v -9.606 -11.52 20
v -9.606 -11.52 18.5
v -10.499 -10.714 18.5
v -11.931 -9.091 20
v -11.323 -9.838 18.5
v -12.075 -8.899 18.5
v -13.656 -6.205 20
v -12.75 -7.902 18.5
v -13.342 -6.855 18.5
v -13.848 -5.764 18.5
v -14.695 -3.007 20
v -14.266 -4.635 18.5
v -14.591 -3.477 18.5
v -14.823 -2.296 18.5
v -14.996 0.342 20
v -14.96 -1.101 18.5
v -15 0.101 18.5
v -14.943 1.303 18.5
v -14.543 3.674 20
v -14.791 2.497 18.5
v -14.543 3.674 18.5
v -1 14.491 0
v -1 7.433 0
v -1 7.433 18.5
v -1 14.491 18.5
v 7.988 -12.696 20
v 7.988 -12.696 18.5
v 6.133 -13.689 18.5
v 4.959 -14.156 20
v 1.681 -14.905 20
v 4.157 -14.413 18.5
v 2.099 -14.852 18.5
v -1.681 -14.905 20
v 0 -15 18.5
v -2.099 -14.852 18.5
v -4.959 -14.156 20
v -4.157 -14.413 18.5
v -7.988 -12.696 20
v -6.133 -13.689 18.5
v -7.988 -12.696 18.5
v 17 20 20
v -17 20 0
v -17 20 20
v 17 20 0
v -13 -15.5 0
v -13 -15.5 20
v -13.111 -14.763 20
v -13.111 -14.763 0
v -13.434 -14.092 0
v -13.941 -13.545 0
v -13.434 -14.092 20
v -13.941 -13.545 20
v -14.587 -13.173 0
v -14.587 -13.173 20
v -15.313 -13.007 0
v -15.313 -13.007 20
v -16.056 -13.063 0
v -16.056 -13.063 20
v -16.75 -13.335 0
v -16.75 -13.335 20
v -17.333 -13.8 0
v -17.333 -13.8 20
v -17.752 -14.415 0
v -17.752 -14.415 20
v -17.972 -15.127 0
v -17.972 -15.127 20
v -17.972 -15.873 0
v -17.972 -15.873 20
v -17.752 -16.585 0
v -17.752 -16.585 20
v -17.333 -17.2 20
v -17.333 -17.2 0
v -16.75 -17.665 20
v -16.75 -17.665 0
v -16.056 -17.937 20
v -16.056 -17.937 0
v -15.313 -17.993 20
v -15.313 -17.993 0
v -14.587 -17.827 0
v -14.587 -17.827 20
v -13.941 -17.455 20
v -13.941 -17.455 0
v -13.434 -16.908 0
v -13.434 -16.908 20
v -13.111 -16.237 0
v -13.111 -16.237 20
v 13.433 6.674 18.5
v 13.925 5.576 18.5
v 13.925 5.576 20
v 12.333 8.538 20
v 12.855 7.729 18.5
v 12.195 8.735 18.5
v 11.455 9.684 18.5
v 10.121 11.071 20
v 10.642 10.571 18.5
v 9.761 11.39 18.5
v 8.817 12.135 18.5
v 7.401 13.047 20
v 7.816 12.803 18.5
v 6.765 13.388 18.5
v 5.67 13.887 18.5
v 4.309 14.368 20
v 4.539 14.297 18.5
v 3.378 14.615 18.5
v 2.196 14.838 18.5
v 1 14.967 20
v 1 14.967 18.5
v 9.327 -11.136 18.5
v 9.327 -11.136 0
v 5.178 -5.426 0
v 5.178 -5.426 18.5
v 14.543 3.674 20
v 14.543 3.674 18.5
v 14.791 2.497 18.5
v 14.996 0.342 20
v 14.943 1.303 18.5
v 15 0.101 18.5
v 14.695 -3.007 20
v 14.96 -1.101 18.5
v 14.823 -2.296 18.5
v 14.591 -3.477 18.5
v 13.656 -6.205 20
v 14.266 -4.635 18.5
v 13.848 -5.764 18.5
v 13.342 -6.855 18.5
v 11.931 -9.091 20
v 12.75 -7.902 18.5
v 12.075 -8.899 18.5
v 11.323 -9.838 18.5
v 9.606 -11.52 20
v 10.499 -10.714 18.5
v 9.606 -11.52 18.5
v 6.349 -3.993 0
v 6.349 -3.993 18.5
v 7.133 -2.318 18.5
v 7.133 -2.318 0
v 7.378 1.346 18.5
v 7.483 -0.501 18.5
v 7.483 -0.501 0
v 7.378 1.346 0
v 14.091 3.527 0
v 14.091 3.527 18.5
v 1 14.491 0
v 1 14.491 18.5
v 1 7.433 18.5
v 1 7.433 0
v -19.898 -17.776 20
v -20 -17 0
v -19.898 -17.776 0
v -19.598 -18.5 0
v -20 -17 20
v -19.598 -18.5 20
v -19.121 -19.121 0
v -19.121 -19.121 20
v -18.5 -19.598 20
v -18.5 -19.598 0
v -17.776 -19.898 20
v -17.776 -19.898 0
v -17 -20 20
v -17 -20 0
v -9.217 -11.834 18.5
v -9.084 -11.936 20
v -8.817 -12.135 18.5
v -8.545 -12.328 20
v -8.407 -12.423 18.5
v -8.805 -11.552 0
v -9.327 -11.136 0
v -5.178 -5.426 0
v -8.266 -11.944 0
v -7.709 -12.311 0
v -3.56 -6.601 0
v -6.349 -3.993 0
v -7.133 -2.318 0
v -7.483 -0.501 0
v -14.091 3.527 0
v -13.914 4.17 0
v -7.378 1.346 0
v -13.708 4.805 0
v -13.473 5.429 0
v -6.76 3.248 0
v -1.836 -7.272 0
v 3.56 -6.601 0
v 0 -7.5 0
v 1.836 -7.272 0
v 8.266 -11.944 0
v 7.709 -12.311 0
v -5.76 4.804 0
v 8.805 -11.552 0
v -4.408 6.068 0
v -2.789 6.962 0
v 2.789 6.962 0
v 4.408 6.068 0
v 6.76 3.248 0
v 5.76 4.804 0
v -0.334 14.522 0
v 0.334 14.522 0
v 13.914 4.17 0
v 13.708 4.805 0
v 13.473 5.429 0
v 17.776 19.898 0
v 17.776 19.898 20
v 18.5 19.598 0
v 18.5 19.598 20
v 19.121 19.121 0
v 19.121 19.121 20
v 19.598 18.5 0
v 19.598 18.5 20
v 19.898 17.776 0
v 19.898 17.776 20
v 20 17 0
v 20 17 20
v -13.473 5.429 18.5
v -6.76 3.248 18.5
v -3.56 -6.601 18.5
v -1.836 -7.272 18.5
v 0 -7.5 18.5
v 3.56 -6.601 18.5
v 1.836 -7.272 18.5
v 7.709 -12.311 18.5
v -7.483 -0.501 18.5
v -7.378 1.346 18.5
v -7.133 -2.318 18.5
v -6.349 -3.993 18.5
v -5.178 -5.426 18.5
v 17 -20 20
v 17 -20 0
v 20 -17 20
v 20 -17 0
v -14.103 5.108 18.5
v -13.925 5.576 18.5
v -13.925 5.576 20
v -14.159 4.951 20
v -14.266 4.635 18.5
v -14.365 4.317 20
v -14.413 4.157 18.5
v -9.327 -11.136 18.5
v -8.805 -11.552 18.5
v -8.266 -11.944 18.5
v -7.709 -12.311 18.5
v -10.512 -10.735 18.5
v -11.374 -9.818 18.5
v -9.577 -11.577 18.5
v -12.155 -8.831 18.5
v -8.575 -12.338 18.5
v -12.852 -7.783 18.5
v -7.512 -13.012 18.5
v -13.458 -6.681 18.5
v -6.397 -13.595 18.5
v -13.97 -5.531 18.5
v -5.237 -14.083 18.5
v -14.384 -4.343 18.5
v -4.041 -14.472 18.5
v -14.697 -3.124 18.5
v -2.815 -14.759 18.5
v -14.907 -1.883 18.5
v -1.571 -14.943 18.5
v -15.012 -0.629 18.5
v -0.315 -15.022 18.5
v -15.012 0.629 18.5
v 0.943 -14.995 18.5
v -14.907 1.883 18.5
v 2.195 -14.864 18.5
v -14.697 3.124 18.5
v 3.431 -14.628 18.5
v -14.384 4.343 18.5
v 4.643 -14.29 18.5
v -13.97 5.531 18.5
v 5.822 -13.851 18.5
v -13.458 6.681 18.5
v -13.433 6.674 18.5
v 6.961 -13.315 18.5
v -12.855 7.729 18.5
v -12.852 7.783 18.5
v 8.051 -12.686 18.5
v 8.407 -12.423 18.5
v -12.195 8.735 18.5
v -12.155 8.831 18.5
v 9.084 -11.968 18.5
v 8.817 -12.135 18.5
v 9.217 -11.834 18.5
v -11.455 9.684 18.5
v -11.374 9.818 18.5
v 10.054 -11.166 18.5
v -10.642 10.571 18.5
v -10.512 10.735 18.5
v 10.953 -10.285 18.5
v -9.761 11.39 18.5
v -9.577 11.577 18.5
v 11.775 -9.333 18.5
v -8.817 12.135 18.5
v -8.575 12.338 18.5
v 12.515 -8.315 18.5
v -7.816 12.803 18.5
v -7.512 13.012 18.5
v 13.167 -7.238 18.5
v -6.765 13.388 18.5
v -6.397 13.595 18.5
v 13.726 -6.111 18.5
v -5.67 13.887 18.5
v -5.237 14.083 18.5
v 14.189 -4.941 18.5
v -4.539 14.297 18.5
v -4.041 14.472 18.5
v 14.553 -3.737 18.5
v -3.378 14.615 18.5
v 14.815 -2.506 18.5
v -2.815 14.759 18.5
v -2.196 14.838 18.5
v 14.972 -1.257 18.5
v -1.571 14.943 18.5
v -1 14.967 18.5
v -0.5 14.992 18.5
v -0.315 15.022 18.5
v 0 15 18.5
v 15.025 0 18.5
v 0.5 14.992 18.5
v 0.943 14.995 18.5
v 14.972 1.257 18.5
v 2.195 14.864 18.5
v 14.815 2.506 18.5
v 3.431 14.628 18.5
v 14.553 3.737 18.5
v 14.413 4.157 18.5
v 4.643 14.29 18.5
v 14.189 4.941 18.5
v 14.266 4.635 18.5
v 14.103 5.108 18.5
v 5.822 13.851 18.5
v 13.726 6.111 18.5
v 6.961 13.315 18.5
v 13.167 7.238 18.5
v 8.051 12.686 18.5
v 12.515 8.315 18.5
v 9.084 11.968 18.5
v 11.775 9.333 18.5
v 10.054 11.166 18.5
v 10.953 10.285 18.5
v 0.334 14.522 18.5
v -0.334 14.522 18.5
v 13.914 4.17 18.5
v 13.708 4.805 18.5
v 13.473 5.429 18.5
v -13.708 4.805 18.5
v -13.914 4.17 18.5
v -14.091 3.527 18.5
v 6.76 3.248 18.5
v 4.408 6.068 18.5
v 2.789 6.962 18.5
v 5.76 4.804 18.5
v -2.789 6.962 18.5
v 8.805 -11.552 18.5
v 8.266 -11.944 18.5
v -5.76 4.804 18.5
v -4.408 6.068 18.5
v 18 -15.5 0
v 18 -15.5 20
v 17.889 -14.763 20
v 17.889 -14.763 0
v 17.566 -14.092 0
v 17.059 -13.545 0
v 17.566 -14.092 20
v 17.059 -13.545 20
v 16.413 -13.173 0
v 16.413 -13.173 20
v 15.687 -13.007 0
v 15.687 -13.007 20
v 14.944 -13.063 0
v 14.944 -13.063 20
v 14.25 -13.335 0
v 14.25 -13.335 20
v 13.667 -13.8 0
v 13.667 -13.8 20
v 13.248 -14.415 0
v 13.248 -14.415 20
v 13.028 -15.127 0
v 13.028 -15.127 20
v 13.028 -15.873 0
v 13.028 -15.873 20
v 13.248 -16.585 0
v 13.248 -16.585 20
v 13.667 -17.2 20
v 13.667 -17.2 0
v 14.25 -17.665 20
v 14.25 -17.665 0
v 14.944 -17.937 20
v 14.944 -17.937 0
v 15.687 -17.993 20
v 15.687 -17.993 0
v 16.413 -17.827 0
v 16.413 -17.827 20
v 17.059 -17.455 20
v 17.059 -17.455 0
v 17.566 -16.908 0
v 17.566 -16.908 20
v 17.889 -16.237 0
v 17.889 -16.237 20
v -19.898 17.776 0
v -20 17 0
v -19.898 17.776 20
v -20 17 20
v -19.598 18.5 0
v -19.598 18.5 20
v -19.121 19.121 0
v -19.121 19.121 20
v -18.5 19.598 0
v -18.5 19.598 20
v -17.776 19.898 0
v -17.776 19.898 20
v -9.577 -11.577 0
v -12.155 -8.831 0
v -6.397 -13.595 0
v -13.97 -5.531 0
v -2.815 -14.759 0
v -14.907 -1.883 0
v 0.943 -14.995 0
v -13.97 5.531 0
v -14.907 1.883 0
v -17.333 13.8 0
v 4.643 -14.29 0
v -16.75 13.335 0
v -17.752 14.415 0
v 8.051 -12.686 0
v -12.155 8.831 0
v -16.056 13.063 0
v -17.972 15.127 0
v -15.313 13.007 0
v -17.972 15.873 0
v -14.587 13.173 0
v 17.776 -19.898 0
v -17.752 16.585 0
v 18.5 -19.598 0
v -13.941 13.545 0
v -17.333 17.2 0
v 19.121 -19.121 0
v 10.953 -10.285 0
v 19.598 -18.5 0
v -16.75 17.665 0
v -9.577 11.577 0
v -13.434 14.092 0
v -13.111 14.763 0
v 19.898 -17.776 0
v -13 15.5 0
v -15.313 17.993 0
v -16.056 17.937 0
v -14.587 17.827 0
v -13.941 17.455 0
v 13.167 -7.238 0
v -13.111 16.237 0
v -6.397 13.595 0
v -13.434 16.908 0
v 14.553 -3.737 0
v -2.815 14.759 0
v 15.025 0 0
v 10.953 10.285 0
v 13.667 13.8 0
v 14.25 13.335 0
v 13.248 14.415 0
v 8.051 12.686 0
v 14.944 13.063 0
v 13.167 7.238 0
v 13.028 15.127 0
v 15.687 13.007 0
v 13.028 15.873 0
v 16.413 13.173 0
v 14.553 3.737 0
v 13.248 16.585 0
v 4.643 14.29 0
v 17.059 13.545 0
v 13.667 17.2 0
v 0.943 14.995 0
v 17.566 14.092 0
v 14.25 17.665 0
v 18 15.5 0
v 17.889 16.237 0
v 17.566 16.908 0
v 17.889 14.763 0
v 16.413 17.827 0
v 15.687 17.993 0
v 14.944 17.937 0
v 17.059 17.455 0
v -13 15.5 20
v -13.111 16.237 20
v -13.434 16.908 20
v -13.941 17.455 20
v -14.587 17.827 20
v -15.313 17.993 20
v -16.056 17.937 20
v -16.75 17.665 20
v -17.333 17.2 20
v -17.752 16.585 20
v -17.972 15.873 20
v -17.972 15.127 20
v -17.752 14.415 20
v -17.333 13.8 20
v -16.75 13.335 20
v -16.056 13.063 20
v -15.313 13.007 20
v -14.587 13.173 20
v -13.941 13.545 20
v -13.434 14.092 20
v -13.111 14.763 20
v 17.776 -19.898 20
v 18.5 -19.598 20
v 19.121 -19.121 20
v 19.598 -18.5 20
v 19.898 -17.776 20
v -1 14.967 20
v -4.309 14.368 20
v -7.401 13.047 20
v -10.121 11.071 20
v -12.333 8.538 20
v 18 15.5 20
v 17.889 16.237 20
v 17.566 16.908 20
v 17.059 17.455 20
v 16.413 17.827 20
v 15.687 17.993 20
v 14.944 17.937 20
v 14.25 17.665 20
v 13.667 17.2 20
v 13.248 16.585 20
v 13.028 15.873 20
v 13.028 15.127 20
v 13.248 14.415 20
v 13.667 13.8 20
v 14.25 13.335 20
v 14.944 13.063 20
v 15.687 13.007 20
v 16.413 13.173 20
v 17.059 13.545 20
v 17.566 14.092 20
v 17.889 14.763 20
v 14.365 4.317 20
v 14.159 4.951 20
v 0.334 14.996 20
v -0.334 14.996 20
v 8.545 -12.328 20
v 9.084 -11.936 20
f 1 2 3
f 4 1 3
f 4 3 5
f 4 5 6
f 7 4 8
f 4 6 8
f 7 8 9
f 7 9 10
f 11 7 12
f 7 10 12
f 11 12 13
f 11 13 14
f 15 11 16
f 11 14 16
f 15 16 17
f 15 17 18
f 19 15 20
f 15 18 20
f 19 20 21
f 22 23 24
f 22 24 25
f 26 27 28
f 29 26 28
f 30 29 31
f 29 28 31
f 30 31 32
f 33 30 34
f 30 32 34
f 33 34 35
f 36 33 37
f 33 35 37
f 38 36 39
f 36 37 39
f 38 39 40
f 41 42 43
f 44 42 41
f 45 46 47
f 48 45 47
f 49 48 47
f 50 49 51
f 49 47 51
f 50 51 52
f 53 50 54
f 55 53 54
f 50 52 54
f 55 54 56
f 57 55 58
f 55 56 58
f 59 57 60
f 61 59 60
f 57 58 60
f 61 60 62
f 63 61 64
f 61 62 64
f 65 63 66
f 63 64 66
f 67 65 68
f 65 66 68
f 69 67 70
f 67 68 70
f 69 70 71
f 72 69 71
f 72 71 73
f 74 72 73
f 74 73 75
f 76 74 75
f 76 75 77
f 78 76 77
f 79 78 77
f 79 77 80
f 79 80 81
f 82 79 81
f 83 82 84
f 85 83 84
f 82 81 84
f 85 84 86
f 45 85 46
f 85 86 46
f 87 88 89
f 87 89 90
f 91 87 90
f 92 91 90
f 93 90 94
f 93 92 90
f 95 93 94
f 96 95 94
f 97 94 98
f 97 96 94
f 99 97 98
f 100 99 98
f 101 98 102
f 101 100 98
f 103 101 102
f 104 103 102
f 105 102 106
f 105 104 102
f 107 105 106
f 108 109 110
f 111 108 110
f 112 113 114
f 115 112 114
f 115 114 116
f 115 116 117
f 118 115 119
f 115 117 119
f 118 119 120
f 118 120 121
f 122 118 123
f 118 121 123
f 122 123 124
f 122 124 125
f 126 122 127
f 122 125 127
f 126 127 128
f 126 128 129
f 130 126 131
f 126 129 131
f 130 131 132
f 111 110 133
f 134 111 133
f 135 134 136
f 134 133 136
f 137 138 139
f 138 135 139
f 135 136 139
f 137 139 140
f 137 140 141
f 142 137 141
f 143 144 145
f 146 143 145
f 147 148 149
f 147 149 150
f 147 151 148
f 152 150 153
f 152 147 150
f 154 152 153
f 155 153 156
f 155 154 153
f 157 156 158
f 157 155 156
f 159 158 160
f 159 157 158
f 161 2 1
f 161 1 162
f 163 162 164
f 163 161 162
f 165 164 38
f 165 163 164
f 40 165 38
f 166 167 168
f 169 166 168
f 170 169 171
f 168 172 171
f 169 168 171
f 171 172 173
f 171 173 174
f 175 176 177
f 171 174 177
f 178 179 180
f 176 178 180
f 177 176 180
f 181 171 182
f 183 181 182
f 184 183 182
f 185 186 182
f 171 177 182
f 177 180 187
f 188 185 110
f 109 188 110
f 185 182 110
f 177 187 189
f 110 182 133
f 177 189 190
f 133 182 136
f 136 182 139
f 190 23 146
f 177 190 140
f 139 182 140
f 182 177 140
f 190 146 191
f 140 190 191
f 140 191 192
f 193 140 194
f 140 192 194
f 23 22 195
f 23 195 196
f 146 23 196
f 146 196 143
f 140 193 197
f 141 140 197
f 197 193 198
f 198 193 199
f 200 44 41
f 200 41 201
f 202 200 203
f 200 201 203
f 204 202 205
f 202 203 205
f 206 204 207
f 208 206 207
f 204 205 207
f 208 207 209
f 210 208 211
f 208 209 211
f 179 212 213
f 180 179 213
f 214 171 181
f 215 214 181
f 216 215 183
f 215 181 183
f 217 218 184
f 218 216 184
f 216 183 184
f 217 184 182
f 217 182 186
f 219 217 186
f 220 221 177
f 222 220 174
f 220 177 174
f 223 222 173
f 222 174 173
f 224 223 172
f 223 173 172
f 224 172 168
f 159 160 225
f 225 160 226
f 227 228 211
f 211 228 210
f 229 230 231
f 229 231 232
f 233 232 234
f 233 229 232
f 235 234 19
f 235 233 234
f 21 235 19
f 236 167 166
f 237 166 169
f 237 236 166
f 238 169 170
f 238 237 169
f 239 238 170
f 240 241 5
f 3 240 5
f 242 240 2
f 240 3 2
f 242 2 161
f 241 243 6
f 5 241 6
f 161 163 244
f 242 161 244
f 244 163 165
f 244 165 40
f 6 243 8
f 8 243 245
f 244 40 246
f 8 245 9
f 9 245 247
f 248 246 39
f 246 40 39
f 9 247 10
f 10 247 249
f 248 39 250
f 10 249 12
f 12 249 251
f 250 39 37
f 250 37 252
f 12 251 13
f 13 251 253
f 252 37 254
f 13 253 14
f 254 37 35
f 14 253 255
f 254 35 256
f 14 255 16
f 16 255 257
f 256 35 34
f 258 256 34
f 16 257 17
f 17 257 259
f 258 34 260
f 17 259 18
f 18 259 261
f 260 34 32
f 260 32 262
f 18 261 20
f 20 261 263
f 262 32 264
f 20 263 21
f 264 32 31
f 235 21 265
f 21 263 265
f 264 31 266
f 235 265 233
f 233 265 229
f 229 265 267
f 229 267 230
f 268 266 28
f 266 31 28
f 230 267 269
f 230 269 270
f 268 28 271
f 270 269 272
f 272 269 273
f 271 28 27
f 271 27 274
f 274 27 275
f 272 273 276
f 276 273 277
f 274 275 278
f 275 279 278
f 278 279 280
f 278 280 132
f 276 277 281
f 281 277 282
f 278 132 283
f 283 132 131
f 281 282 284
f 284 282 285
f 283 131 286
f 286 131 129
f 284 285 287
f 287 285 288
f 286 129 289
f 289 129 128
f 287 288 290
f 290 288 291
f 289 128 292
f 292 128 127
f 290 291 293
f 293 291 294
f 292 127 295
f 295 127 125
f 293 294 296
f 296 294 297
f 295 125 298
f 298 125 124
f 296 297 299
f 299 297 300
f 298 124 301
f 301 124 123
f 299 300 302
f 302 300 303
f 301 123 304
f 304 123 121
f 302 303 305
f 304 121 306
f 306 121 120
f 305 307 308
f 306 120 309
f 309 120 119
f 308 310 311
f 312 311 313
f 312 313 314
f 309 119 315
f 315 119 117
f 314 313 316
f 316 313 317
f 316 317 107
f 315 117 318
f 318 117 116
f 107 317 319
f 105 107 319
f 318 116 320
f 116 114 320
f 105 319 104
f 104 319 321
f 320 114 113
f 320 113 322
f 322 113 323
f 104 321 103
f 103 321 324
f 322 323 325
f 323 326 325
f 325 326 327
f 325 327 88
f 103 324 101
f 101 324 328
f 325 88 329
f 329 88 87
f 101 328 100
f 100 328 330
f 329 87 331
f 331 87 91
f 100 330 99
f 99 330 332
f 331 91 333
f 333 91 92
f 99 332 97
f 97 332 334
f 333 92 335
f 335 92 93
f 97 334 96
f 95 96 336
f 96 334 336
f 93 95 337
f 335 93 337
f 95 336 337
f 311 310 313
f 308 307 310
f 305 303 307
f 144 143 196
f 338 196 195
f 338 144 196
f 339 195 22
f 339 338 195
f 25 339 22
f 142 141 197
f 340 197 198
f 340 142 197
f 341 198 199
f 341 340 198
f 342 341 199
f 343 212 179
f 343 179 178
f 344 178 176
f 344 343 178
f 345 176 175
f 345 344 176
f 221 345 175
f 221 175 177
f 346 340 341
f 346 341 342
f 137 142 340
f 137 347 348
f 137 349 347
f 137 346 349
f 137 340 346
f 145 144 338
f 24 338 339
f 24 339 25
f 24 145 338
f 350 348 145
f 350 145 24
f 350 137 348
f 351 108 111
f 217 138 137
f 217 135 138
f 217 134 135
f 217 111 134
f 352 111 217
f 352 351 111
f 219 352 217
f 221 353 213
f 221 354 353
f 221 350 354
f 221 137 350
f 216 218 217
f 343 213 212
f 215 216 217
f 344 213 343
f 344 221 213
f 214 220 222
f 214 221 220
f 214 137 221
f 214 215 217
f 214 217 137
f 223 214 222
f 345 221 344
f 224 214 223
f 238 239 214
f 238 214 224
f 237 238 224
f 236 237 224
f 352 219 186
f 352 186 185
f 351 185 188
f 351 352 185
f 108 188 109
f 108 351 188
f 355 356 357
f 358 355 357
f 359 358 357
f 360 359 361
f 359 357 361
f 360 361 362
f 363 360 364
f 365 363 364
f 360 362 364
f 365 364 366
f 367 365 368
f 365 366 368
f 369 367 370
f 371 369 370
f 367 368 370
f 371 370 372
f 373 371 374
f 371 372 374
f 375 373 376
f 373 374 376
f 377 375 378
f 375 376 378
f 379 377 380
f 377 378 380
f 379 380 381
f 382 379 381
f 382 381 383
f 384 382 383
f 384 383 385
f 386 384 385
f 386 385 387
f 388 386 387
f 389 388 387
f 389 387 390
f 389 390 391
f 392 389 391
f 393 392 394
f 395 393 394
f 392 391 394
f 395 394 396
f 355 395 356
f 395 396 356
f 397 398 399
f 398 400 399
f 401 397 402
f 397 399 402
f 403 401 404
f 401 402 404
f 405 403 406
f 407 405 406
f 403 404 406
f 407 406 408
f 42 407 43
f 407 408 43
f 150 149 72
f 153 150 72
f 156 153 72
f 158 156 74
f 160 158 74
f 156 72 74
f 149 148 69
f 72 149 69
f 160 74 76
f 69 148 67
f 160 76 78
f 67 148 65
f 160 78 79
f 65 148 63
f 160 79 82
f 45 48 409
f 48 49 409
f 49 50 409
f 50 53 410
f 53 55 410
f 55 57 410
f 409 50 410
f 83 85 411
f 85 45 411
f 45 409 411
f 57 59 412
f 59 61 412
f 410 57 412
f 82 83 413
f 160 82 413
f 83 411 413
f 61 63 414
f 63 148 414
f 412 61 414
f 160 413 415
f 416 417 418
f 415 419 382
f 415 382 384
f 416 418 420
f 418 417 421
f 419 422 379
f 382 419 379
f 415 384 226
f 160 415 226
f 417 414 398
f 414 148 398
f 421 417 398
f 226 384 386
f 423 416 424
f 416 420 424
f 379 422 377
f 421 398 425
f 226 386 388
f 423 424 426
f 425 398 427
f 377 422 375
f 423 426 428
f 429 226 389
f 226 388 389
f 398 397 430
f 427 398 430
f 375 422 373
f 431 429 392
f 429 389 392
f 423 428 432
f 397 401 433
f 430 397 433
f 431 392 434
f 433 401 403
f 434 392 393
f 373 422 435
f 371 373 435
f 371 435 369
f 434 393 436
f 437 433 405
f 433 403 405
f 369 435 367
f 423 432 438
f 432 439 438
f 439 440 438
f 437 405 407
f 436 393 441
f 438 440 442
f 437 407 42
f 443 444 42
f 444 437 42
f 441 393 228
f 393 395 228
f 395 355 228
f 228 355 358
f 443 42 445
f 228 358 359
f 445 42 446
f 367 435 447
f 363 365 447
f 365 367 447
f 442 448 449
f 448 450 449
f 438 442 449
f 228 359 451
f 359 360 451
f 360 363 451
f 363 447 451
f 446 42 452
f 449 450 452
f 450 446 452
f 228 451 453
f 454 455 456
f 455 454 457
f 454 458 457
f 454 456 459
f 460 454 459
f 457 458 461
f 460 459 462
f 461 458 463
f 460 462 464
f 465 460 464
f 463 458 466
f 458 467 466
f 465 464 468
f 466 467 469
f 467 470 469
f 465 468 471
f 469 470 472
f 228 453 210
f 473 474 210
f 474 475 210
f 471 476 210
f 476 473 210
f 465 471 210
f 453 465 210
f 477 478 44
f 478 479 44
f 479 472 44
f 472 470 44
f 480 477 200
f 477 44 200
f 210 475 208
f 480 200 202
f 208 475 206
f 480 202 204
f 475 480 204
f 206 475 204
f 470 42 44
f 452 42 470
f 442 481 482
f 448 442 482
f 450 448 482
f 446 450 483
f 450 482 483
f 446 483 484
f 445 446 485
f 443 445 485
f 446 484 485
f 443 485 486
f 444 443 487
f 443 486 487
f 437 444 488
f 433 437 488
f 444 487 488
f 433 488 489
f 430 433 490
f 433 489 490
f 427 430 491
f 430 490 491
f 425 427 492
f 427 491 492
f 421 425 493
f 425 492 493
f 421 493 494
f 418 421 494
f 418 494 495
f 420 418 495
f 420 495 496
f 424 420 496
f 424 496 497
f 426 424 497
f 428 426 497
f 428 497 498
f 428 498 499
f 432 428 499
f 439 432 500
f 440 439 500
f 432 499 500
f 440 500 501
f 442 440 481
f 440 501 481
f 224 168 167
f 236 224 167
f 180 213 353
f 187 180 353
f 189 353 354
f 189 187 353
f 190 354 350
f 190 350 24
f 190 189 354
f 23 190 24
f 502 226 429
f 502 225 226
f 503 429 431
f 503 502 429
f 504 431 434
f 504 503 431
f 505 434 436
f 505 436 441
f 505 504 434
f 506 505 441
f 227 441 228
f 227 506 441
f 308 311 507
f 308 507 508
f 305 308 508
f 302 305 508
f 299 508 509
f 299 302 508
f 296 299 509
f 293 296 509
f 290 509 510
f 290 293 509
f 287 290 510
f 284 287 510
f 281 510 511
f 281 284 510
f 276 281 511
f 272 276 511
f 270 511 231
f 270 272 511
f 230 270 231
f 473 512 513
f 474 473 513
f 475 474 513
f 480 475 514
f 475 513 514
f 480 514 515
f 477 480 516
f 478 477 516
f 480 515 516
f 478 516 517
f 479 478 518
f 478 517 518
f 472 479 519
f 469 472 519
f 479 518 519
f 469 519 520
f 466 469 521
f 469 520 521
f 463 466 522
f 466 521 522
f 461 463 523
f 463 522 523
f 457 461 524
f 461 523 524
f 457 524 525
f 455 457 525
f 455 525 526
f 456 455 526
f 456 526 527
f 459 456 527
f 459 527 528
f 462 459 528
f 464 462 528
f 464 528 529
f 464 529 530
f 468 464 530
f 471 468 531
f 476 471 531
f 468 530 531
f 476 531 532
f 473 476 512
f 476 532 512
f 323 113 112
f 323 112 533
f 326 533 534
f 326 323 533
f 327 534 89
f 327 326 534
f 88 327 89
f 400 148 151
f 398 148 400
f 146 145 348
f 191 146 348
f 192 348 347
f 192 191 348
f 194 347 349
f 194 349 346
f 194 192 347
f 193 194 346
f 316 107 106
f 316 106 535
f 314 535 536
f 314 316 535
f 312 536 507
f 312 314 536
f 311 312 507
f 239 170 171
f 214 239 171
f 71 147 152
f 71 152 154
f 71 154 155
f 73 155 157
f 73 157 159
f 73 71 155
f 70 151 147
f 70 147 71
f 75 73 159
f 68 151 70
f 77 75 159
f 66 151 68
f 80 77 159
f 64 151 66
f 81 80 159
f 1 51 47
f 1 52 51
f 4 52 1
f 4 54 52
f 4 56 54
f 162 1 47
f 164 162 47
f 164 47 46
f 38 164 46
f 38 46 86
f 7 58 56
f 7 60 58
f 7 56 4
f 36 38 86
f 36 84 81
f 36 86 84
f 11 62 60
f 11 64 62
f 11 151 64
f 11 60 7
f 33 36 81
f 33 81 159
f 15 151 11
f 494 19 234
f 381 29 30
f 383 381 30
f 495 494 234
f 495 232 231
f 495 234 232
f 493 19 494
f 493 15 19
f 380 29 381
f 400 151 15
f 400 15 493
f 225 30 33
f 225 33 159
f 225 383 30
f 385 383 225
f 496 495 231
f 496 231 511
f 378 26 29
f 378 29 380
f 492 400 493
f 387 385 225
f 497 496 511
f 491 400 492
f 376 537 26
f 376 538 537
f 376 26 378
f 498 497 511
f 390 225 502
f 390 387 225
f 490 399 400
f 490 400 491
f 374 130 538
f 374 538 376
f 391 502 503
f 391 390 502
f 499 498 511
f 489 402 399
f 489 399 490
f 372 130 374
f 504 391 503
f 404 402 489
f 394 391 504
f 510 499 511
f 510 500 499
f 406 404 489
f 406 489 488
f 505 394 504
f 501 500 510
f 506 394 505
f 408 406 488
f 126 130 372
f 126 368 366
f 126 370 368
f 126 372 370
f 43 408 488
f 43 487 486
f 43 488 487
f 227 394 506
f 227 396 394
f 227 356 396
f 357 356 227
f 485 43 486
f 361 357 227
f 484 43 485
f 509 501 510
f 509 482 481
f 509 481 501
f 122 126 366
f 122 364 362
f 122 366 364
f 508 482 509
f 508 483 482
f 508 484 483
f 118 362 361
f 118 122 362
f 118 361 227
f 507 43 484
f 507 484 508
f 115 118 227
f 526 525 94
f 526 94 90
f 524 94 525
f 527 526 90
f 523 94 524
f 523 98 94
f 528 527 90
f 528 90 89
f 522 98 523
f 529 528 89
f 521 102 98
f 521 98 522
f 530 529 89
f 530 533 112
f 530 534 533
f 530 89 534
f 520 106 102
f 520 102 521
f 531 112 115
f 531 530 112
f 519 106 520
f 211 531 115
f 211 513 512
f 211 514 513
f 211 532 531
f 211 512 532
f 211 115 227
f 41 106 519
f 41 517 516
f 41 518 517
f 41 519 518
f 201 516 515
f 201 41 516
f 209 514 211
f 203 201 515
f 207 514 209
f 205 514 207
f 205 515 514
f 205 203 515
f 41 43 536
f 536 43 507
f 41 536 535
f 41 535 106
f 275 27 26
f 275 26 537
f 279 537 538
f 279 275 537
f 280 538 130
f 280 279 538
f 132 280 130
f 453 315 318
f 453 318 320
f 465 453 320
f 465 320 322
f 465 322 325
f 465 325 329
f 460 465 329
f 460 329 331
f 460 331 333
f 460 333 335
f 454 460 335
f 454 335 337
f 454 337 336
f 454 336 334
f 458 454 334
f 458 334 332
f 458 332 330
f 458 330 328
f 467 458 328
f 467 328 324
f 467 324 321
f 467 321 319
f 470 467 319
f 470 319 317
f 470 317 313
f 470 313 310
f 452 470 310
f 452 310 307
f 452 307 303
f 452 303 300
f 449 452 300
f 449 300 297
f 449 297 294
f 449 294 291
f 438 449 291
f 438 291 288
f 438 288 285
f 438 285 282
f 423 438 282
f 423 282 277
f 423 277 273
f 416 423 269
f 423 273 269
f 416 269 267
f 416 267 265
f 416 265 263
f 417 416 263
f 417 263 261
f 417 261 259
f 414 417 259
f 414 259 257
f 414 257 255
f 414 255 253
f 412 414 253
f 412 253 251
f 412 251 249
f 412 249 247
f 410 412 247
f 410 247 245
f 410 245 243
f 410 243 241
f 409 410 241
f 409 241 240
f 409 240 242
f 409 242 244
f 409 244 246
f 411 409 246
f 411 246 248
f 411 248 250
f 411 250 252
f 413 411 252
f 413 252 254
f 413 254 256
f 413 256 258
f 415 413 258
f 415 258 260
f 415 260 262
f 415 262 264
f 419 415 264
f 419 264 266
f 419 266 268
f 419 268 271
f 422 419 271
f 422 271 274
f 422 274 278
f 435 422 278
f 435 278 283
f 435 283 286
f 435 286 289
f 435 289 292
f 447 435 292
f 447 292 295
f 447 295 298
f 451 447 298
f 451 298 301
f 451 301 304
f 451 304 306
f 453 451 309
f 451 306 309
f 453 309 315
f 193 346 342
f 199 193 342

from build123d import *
from build123d.topology import SkipClean

# Parameters (mm, degrees)
SKETCH2_W           = 40
SKETCH2_H           = 40
BOSS_EXTRUDE1_DEPTH = 20
SKETCH3_R           = 2.5
CUT_EXTRUDE1_DEPTH  = 20
FILLET1_R           = 3
CUT_EXTRUDE4_DEPTH  = 35.641016151
CUT_EXTRUDE5_START  = -1.5
SKETCH5_R           = 15
CUT_EXTRUDE5_DEPTH  = 1.5
SKETCH7_R           = 15.025
SKETCH7_R_2         = 14.525398349
CUT_EXTRUDE12_DEPTH = 26


with BuildPart() as part:
    # Sketch2 → Boss-Extrude1 (new body)
    with BuildSketch(Plane.XY):
        Rectangle(SKETCH2_W, SKETCH2_H)
    extrude(amount=BOSS_EXTRUDE1_DEPTH)

    # Sketch3 → Cut-Extrude1 (cut)
    with BuildSketch(Plane.XY.offset(20)):
        with Locations((-15.5, 15.5)):
            Circle(SKETCH3_R)
        with Locations((15.5, 15.5)):
            Circle(SKETCH3_R)
        with Locations((15.5, -15.5)):
            Circle(SKETCH3_R)
        with Locations((-15.5, -15.5)):
            Circle(SKETCH3_R)
    extrude(amount=-CUT_EXTRUDE1_DEPTH, mode=Mode.SUBTRACT)

    # Fillet1
    fillet1_edges = [part.edges().sort_by_distance(p)[0] for p in [
        (20, -20, 10),
        (-20, -20, 10),
        (-20, 20, 10),
        (20, 20, 10),
    ]]
    fillet(fillet1_edges, radius=FILLET1_R)

    # Sketch4 → Cut-Extrude4 (cut, through all)
    with BuildSketch(Plane(origin=(0, 0, 0), x_dir=(-1, 0, 0), z_dir=(0, 0, -1))):
        with BuildLine():
            Line((13.925093563, 5.575999395), (6.760218783, 3.247990458))
            ThreePointArc((6.760218783, 3.247990458), (4.408389392, 6.067627458), (1, 7.433034374))
            Line((1, 7.433034374), (1, 14.966629547))
            ThreePointArc((1, 14.966629547), (8.816778784, 12.135254916), (13.925093563, 5.575999395))
        make_face()
        with BuildLine():
            Line((-1, 14.966629547), (-1, 7.433034374))
            ThreePointArc((-1, 7.433034374), (-4.408389392, 6.067627458), (-6.760218783, 3.247990458))
            Line((-6.760218783, 3.247990458), (-13.925093563, 5.575999395))
            ThreePointArc((-13.925093563, 5.575999395), (-8.816778784, 12.135254916), (-1, 14.966629547))
        make_face()
        with BuildLine():
            Line((14.543127552, 3.673886362), (7.378252771, 1.345877425))
            ThreePointArc((7.378252771, 1.345877425), (7.132923872, -2.317627458), (5.178044979, -5.425665876))
            Line((5.178044979, -5.425665876), (9.606181119, -11.5204724))
            ThreePointArc((9.606181119, -11.5204724), (14.265847744, -4.635254916), (14.543127552, 3.673886362))
        make_face()
        with BuildLine():
            Line((7.98814713, -12.696042904), (3.56001099, -6.60123638))
            ThreePointArc((3.56001099, -6.60123638), (0, -7.5), (-3.56001099, -6.60123638))
            Line((-3.56001099, -6.60123638), (-7.98814713, -12.696042904))
            ThreePointArc((-7.98814713, -12.696042904), (0, -15), (7.98814713, -12.696042904))
        make_face()
        with BuildLine():
            Line((-9.606181119, -11.5204724), (-5.178044979, -5.425665876))
            ThreePointArc((-5.178044979, -5.425665876), (-7.132923872, -2.317627458), (-7.378252771, 1.345877425))
            Line((-7.378252771, 1.345877425), (-14.543127552, 3.673886362))
            ThreePointArc((-14.543127552, 3.673886362), (-14.265847744, -4.635254916), (-9.606181119, -11.5204724))
        make_face()
    extrude(amount=-CUT_EXTRUDE4_DEPTH, mode=Mode.SUBTRACT)

    # Sketch5 → Cut-Extrude5 (cut)
    with BuildSketch(Plane.XY.offset(20).offset(CUT_EXTRUDE5_START)):
        with Locations(Location((0, 0, 0), (0, 0, 180))):
            Circle(SKETCH5_R)
    extrude(amount=CUT_EXTRUDE5_DEPTH, mode=Mode.SUBTRACT)

    # Sketch7 → Cut-Extrude12 (cut)
    with SkipClean():  # the faces are left unmerged after this step: merging them gives an invalid solid
        with BuildSketch(Plane.XY.offset(18.5)):
            Circle(SKETCH7_R)
            Circle(SKETCH7_R_2, mode=Mode.SUBTRACT)
        extrude(amount=-CUT_EXTRUDE12_DEPTH, mode=Mode.SUBTRACT)


with BuildPart() as cut_extrude12_piece_1:
    # of the separate pieces the step leaves, piece 1, a body of its own (cut_extrude12_pieces)
    add(part.part.solids().sort_by_distance((-17, -20, 0))[0])


with BuildPart() as cut_extrude12_piece_2:
    # of the separate pieces the step leaves, piece 2, a body of its own (cut_extrude12_pieces)
    add(part.part.solids().sort_by_distance((3.56001099, -6.60123638, 0))[0])


solid = Compound([cut_extrude12_piece_1.part, cut_extrude12_piece_2.part])
